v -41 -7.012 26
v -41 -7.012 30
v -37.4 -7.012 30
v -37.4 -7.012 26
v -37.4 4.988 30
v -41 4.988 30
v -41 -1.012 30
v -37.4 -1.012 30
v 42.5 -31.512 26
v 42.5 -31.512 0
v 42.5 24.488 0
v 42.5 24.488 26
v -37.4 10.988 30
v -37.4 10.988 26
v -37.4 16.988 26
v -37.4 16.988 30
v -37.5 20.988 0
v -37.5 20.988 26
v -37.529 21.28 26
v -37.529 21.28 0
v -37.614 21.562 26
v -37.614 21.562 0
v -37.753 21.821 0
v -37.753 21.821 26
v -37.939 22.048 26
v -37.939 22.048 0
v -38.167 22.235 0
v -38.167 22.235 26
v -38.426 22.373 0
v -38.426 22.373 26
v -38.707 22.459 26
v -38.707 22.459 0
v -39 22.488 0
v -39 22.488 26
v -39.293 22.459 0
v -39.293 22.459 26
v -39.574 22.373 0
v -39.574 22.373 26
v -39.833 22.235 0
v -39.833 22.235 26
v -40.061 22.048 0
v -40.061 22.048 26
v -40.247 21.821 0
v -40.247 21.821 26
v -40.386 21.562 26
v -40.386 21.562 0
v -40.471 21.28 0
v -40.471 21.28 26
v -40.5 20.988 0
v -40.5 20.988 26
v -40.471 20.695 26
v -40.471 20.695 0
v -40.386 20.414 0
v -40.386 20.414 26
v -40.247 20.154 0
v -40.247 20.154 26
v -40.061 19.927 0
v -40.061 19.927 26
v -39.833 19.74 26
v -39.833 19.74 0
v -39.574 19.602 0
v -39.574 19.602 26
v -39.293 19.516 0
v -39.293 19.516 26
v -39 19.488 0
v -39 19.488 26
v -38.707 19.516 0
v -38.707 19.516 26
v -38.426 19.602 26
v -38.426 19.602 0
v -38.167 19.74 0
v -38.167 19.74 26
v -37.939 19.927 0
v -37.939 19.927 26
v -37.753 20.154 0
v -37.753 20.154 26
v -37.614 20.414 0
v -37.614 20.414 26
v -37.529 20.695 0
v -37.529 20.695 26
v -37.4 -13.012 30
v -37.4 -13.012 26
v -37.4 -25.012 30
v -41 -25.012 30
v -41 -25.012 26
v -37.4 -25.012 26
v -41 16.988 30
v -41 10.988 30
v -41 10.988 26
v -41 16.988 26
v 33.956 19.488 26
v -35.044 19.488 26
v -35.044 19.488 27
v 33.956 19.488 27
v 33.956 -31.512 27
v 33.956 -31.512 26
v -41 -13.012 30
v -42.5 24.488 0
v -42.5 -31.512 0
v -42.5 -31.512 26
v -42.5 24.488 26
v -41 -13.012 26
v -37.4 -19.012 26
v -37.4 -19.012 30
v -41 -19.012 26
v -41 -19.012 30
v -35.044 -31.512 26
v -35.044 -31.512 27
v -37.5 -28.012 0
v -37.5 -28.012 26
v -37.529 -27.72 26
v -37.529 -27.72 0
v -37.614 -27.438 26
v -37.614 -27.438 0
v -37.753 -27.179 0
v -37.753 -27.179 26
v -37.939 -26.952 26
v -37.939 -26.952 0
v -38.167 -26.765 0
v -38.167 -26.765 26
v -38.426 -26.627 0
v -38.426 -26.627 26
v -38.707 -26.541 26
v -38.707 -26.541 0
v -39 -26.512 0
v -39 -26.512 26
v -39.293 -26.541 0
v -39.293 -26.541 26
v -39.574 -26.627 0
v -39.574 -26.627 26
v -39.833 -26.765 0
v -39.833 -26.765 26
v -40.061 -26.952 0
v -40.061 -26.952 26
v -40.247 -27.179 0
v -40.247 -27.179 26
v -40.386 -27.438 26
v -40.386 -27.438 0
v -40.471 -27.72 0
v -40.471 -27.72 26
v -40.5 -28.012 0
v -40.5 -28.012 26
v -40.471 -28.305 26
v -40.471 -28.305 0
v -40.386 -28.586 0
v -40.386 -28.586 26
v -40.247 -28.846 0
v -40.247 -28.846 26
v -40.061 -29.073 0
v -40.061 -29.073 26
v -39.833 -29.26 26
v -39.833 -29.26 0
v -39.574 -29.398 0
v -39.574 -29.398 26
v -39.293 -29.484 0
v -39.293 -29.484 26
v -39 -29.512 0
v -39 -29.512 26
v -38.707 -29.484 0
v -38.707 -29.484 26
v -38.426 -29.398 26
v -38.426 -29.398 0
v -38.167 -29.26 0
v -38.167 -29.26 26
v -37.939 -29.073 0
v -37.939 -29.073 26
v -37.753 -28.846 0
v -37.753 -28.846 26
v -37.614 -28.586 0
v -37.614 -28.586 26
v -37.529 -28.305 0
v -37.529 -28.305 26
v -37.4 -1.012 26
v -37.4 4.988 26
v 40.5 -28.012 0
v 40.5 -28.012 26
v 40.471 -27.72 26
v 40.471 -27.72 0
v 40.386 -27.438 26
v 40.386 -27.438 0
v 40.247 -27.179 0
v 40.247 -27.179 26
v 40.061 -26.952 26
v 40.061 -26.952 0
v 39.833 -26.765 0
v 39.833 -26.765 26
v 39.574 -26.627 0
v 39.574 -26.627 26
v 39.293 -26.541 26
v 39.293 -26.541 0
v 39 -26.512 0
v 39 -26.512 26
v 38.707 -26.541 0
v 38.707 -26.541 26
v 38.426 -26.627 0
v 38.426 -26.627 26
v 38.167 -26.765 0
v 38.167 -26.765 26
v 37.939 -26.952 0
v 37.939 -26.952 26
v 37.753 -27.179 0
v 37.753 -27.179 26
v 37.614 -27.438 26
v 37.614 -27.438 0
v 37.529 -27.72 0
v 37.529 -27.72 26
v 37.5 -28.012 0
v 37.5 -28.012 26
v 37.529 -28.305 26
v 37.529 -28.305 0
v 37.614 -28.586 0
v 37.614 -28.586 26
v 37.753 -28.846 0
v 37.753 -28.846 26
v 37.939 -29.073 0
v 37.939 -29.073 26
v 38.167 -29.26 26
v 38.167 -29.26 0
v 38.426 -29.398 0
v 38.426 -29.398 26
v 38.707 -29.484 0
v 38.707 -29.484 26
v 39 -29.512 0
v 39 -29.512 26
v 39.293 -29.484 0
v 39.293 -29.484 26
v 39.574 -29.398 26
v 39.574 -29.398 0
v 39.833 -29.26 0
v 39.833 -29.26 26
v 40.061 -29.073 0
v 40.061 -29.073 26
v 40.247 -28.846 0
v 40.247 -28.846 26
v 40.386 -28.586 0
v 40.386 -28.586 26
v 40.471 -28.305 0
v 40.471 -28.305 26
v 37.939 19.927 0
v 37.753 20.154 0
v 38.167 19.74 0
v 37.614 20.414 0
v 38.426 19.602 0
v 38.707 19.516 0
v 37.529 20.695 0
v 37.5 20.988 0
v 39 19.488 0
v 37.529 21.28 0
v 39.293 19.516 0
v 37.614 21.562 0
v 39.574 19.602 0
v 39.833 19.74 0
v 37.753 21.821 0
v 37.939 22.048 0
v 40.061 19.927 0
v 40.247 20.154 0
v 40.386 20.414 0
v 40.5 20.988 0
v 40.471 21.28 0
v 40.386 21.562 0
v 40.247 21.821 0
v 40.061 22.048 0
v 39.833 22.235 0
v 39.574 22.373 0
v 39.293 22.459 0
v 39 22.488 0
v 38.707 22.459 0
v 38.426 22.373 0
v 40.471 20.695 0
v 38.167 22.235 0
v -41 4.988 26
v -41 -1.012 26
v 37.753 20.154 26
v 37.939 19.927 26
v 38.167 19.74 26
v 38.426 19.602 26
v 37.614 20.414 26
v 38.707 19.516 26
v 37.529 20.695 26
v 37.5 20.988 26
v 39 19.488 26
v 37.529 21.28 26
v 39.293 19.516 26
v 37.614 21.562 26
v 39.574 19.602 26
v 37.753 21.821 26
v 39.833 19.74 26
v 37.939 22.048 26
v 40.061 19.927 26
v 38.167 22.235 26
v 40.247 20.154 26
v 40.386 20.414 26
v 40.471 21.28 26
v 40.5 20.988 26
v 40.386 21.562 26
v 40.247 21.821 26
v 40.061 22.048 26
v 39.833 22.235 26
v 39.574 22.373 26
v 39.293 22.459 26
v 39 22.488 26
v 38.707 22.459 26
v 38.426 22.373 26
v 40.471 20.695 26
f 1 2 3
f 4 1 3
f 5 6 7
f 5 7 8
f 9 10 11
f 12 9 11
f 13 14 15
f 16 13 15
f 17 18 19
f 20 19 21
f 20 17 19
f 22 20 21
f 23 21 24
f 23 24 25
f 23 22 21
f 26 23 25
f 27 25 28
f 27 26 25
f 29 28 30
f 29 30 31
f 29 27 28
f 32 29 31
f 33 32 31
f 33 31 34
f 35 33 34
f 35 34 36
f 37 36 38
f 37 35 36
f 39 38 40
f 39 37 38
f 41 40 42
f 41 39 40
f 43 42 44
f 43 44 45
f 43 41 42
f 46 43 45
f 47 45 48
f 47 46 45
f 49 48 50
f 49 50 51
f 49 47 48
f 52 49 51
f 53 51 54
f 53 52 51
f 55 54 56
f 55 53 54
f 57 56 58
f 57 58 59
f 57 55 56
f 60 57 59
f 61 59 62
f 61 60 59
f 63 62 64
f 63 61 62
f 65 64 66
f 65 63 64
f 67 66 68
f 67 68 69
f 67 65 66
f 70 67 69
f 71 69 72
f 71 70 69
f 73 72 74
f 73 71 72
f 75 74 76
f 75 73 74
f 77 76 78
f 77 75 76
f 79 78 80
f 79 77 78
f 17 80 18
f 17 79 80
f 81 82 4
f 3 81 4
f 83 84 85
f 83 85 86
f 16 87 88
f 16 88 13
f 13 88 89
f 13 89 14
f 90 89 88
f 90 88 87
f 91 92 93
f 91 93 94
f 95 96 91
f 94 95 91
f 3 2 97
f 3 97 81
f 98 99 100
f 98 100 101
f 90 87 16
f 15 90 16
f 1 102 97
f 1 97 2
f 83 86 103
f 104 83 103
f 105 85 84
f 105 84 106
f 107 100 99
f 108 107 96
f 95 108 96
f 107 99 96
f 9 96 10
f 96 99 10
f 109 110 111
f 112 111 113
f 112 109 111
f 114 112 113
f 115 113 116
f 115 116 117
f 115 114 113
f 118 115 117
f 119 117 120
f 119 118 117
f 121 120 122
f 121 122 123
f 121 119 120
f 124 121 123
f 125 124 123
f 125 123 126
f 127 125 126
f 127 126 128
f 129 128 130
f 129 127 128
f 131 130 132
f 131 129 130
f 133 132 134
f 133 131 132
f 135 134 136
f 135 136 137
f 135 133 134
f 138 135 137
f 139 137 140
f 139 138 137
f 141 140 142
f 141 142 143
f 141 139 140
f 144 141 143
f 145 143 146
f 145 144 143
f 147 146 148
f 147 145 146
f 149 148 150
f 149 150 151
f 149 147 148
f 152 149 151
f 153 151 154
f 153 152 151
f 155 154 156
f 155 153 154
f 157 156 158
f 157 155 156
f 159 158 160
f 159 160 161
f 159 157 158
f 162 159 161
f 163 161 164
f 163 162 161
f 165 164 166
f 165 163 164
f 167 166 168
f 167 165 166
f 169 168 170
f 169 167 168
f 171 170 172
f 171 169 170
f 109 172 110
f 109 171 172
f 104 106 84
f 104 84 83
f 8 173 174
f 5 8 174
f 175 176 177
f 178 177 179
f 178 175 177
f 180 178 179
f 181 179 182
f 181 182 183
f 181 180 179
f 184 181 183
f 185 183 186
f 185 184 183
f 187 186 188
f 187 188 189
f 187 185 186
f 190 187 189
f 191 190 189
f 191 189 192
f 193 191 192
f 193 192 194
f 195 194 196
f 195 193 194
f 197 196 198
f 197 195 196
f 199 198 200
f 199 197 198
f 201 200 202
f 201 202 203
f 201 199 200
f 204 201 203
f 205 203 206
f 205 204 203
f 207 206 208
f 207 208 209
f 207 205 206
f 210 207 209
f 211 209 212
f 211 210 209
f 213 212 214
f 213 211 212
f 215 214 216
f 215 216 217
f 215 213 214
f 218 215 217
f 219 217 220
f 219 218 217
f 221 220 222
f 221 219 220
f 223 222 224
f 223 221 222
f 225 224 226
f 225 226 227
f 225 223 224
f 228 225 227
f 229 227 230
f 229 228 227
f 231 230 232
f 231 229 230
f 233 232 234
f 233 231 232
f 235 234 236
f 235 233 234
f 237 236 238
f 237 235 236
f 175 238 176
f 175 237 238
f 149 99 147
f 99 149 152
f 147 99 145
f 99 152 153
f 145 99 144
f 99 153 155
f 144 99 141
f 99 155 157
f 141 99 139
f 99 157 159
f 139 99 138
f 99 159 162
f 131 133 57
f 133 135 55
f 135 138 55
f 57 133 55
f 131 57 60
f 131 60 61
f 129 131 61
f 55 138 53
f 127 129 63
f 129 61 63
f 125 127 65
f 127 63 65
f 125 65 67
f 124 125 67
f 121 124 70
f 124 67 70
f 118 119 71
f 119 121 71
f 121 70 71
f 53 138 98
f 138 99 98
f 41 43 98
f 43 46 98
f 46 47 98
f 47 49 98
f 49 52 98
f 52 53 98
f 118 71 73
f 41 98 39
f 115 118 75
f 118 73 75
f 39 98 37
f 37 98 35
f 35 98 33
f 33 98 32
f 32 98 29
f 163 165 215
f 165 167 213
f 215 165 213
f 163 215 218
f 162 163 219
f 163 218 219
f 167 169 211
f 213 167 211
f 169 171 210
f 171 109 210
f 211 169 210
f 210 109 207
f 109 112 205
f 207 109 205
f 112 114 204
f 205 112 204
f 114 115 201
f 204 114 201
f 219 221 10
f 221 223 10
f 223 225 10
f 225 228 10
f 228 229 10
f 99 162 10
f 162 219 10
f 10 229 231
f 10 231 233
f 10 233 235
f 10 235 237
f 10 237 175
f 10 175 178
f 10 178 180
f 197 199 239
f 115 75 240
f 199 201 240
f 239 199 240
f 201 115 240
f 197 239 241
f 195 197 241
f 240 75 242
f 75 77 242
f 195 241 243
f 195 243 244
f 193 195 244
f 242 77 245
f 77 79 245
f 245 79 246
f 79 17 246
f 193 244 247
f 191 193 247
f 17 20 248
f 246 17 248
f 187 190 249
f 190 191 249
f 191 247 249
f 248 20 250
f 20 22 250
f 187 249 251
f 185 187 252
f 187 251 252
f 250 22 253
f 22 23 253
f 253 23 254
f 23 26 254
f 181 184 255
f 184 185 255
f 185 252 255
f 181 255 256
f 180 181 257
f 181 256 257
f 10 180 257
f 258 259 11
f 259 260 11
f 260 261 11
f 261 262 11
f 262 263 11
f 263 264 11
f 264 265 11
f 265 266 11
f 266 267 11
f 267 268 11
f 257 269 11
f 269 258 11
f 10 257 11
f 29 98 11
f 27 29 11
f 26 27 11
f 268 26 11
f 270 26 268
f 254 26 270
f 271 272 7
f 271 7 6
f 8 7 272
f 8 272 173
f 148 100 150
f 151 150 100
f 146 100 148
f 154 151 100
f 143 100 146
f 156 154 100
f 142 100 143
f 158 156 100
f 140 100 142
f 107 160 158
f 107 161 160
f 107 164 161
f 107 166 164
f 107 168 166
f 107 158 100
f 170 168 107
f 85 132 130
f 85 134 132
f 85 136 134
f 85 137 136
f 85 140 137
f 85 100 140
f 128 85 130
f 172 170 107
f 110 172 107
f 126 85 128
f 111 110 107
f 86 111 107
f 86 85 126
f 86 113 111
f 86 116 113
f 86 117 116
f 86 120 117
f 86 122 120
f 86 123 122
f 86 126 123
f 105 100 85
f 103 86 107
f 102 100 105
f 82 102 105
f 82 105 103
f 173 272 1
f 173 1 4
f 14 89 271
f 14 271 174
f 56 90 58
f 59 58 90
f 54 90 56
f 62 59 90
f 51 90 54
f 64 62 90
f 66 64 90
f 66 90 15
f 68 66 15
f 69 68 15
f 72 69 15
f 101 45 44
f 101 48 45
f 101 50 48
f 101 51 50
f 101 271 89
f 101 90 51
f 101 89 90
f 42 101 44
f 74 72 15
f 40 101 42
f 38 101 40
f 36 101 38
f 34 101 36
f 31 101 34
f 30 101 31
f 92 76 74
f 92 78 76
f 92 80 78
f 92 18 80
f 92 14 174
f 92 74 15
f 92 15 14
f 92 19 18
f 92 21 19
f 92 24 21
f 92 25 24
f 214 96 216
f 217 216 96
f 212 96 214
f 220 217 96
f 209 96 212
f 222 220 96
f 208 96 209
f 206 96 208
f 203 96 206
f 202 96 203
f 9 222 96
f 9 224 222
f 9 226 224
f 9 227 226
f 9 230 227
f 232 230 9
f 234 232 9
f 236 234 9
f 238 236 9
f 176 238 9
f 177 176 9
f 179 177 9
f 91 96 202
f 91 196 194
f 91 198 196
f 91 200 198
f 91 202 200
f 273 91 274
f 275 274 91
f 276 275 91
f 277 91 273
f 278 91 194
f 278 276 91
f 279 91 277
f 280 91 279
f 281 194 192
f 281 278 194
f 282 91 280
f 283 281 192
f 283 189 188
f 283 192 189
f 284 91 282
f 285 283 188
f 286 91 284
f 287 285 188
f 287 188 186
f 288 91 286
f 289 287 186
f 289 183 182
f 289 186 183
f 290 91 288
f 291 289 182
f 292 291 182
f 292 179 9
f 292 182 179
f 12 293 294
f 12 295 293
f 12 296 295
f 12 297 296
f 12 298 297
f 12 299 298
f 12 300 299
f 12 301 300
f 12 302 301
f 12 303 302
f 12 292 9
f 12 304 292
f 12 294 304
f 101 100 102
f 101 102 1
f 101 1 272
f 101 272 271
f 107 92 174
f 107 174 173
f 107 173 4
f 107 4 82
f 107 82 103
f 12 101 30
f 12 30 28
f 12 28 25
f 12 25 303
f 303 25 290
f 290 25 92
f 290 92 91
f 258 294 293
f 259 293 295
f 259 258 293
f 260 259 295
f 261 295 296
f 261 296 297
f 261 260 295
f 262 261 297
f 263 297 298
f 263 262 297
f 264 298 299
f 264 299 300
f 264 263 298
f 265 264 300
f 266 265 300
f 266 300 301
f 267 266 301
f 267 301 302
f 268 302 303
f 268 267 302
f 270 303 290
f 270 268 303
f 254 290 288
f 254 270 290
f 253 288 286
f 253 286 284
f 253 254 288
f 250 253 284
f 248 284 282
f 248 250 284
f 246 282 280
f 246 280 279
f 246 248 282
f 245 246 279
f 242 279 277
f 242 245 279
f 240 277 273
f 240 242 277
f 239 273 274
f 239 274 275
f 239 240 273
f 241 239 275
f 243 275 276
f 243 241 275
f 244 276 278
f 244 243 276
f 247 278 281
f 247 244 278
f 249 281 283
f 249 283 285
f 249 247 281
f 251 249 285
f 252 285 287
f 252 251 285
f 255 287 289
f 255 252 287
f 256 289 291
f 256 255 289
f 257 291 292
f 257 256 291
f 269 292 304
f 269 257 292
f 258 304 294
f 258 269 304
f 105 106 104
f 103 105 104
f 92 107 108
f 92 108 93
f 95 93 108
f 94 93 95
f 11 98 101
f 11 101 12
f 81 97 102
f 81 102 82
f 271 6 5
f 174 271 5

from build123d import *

# Parameters (mm, degrees)
F0_W     = 85
F0_H     = 56
F0_R     = 1.5
F1_DEPTH = 26
F2_W     = 69
F2_H     = 51
F3_DEPTH = 1
F4_W     = 3.6
F4_H     = 6
F5_DEPTH = 4


with BuildPart() as f1:
    # F0 (on Top) → F1 (new body)
    with BuildSketch(Plane.XY):
        with Locations((0, -3.51239704)):
            Rectangle(F0_W, F0_H)
        with Locations((-39, -28.01239704)):
            Circle(F0_R, mode=Mode.SUBTRACT)
        with Locations((39, -28.01239704)):
            Circle(F0_R, mode=Mode.SUBTRACT)
        with Locations((-39, 20.98760296)):
            Circle(F0_R, mode=Mode.SUBTRACT)
        with Locations((39, 20.98760296)):
            Circle(F0_R, mode=Mode.SUBTRACT)
    extrude(amount=F1_DEPTH)

    # F2 (on face) → F3 (join)
    with BuildSketch(Plane.XY.offset(26)):
        with Locations((-0.5440037453, -6.01239704)):
            Rectangle(F2_W, F2_H)
    extrude(amount=F3_DEPTH)

    # F4 (on face) → F5 (join)
    with BuildSketch(Plane.XY.offset(26)):
        with Locations((-39.2, 13.98760296)):
            Rectangle(F4_W, F4_H)
        with Locations((-39.2, 1.98760296)):
            Rectangle(F4_W, F4_H)
        with Locations((-39.2, -10.01239704)):
            Rectangle(F4_W, F4_H)
        with Locations((-39.2, -22.01239704)):
            Rectangle(F4_W, F4_H)
    extrude(amount=F5_DEPTH)


solid = f1.part
